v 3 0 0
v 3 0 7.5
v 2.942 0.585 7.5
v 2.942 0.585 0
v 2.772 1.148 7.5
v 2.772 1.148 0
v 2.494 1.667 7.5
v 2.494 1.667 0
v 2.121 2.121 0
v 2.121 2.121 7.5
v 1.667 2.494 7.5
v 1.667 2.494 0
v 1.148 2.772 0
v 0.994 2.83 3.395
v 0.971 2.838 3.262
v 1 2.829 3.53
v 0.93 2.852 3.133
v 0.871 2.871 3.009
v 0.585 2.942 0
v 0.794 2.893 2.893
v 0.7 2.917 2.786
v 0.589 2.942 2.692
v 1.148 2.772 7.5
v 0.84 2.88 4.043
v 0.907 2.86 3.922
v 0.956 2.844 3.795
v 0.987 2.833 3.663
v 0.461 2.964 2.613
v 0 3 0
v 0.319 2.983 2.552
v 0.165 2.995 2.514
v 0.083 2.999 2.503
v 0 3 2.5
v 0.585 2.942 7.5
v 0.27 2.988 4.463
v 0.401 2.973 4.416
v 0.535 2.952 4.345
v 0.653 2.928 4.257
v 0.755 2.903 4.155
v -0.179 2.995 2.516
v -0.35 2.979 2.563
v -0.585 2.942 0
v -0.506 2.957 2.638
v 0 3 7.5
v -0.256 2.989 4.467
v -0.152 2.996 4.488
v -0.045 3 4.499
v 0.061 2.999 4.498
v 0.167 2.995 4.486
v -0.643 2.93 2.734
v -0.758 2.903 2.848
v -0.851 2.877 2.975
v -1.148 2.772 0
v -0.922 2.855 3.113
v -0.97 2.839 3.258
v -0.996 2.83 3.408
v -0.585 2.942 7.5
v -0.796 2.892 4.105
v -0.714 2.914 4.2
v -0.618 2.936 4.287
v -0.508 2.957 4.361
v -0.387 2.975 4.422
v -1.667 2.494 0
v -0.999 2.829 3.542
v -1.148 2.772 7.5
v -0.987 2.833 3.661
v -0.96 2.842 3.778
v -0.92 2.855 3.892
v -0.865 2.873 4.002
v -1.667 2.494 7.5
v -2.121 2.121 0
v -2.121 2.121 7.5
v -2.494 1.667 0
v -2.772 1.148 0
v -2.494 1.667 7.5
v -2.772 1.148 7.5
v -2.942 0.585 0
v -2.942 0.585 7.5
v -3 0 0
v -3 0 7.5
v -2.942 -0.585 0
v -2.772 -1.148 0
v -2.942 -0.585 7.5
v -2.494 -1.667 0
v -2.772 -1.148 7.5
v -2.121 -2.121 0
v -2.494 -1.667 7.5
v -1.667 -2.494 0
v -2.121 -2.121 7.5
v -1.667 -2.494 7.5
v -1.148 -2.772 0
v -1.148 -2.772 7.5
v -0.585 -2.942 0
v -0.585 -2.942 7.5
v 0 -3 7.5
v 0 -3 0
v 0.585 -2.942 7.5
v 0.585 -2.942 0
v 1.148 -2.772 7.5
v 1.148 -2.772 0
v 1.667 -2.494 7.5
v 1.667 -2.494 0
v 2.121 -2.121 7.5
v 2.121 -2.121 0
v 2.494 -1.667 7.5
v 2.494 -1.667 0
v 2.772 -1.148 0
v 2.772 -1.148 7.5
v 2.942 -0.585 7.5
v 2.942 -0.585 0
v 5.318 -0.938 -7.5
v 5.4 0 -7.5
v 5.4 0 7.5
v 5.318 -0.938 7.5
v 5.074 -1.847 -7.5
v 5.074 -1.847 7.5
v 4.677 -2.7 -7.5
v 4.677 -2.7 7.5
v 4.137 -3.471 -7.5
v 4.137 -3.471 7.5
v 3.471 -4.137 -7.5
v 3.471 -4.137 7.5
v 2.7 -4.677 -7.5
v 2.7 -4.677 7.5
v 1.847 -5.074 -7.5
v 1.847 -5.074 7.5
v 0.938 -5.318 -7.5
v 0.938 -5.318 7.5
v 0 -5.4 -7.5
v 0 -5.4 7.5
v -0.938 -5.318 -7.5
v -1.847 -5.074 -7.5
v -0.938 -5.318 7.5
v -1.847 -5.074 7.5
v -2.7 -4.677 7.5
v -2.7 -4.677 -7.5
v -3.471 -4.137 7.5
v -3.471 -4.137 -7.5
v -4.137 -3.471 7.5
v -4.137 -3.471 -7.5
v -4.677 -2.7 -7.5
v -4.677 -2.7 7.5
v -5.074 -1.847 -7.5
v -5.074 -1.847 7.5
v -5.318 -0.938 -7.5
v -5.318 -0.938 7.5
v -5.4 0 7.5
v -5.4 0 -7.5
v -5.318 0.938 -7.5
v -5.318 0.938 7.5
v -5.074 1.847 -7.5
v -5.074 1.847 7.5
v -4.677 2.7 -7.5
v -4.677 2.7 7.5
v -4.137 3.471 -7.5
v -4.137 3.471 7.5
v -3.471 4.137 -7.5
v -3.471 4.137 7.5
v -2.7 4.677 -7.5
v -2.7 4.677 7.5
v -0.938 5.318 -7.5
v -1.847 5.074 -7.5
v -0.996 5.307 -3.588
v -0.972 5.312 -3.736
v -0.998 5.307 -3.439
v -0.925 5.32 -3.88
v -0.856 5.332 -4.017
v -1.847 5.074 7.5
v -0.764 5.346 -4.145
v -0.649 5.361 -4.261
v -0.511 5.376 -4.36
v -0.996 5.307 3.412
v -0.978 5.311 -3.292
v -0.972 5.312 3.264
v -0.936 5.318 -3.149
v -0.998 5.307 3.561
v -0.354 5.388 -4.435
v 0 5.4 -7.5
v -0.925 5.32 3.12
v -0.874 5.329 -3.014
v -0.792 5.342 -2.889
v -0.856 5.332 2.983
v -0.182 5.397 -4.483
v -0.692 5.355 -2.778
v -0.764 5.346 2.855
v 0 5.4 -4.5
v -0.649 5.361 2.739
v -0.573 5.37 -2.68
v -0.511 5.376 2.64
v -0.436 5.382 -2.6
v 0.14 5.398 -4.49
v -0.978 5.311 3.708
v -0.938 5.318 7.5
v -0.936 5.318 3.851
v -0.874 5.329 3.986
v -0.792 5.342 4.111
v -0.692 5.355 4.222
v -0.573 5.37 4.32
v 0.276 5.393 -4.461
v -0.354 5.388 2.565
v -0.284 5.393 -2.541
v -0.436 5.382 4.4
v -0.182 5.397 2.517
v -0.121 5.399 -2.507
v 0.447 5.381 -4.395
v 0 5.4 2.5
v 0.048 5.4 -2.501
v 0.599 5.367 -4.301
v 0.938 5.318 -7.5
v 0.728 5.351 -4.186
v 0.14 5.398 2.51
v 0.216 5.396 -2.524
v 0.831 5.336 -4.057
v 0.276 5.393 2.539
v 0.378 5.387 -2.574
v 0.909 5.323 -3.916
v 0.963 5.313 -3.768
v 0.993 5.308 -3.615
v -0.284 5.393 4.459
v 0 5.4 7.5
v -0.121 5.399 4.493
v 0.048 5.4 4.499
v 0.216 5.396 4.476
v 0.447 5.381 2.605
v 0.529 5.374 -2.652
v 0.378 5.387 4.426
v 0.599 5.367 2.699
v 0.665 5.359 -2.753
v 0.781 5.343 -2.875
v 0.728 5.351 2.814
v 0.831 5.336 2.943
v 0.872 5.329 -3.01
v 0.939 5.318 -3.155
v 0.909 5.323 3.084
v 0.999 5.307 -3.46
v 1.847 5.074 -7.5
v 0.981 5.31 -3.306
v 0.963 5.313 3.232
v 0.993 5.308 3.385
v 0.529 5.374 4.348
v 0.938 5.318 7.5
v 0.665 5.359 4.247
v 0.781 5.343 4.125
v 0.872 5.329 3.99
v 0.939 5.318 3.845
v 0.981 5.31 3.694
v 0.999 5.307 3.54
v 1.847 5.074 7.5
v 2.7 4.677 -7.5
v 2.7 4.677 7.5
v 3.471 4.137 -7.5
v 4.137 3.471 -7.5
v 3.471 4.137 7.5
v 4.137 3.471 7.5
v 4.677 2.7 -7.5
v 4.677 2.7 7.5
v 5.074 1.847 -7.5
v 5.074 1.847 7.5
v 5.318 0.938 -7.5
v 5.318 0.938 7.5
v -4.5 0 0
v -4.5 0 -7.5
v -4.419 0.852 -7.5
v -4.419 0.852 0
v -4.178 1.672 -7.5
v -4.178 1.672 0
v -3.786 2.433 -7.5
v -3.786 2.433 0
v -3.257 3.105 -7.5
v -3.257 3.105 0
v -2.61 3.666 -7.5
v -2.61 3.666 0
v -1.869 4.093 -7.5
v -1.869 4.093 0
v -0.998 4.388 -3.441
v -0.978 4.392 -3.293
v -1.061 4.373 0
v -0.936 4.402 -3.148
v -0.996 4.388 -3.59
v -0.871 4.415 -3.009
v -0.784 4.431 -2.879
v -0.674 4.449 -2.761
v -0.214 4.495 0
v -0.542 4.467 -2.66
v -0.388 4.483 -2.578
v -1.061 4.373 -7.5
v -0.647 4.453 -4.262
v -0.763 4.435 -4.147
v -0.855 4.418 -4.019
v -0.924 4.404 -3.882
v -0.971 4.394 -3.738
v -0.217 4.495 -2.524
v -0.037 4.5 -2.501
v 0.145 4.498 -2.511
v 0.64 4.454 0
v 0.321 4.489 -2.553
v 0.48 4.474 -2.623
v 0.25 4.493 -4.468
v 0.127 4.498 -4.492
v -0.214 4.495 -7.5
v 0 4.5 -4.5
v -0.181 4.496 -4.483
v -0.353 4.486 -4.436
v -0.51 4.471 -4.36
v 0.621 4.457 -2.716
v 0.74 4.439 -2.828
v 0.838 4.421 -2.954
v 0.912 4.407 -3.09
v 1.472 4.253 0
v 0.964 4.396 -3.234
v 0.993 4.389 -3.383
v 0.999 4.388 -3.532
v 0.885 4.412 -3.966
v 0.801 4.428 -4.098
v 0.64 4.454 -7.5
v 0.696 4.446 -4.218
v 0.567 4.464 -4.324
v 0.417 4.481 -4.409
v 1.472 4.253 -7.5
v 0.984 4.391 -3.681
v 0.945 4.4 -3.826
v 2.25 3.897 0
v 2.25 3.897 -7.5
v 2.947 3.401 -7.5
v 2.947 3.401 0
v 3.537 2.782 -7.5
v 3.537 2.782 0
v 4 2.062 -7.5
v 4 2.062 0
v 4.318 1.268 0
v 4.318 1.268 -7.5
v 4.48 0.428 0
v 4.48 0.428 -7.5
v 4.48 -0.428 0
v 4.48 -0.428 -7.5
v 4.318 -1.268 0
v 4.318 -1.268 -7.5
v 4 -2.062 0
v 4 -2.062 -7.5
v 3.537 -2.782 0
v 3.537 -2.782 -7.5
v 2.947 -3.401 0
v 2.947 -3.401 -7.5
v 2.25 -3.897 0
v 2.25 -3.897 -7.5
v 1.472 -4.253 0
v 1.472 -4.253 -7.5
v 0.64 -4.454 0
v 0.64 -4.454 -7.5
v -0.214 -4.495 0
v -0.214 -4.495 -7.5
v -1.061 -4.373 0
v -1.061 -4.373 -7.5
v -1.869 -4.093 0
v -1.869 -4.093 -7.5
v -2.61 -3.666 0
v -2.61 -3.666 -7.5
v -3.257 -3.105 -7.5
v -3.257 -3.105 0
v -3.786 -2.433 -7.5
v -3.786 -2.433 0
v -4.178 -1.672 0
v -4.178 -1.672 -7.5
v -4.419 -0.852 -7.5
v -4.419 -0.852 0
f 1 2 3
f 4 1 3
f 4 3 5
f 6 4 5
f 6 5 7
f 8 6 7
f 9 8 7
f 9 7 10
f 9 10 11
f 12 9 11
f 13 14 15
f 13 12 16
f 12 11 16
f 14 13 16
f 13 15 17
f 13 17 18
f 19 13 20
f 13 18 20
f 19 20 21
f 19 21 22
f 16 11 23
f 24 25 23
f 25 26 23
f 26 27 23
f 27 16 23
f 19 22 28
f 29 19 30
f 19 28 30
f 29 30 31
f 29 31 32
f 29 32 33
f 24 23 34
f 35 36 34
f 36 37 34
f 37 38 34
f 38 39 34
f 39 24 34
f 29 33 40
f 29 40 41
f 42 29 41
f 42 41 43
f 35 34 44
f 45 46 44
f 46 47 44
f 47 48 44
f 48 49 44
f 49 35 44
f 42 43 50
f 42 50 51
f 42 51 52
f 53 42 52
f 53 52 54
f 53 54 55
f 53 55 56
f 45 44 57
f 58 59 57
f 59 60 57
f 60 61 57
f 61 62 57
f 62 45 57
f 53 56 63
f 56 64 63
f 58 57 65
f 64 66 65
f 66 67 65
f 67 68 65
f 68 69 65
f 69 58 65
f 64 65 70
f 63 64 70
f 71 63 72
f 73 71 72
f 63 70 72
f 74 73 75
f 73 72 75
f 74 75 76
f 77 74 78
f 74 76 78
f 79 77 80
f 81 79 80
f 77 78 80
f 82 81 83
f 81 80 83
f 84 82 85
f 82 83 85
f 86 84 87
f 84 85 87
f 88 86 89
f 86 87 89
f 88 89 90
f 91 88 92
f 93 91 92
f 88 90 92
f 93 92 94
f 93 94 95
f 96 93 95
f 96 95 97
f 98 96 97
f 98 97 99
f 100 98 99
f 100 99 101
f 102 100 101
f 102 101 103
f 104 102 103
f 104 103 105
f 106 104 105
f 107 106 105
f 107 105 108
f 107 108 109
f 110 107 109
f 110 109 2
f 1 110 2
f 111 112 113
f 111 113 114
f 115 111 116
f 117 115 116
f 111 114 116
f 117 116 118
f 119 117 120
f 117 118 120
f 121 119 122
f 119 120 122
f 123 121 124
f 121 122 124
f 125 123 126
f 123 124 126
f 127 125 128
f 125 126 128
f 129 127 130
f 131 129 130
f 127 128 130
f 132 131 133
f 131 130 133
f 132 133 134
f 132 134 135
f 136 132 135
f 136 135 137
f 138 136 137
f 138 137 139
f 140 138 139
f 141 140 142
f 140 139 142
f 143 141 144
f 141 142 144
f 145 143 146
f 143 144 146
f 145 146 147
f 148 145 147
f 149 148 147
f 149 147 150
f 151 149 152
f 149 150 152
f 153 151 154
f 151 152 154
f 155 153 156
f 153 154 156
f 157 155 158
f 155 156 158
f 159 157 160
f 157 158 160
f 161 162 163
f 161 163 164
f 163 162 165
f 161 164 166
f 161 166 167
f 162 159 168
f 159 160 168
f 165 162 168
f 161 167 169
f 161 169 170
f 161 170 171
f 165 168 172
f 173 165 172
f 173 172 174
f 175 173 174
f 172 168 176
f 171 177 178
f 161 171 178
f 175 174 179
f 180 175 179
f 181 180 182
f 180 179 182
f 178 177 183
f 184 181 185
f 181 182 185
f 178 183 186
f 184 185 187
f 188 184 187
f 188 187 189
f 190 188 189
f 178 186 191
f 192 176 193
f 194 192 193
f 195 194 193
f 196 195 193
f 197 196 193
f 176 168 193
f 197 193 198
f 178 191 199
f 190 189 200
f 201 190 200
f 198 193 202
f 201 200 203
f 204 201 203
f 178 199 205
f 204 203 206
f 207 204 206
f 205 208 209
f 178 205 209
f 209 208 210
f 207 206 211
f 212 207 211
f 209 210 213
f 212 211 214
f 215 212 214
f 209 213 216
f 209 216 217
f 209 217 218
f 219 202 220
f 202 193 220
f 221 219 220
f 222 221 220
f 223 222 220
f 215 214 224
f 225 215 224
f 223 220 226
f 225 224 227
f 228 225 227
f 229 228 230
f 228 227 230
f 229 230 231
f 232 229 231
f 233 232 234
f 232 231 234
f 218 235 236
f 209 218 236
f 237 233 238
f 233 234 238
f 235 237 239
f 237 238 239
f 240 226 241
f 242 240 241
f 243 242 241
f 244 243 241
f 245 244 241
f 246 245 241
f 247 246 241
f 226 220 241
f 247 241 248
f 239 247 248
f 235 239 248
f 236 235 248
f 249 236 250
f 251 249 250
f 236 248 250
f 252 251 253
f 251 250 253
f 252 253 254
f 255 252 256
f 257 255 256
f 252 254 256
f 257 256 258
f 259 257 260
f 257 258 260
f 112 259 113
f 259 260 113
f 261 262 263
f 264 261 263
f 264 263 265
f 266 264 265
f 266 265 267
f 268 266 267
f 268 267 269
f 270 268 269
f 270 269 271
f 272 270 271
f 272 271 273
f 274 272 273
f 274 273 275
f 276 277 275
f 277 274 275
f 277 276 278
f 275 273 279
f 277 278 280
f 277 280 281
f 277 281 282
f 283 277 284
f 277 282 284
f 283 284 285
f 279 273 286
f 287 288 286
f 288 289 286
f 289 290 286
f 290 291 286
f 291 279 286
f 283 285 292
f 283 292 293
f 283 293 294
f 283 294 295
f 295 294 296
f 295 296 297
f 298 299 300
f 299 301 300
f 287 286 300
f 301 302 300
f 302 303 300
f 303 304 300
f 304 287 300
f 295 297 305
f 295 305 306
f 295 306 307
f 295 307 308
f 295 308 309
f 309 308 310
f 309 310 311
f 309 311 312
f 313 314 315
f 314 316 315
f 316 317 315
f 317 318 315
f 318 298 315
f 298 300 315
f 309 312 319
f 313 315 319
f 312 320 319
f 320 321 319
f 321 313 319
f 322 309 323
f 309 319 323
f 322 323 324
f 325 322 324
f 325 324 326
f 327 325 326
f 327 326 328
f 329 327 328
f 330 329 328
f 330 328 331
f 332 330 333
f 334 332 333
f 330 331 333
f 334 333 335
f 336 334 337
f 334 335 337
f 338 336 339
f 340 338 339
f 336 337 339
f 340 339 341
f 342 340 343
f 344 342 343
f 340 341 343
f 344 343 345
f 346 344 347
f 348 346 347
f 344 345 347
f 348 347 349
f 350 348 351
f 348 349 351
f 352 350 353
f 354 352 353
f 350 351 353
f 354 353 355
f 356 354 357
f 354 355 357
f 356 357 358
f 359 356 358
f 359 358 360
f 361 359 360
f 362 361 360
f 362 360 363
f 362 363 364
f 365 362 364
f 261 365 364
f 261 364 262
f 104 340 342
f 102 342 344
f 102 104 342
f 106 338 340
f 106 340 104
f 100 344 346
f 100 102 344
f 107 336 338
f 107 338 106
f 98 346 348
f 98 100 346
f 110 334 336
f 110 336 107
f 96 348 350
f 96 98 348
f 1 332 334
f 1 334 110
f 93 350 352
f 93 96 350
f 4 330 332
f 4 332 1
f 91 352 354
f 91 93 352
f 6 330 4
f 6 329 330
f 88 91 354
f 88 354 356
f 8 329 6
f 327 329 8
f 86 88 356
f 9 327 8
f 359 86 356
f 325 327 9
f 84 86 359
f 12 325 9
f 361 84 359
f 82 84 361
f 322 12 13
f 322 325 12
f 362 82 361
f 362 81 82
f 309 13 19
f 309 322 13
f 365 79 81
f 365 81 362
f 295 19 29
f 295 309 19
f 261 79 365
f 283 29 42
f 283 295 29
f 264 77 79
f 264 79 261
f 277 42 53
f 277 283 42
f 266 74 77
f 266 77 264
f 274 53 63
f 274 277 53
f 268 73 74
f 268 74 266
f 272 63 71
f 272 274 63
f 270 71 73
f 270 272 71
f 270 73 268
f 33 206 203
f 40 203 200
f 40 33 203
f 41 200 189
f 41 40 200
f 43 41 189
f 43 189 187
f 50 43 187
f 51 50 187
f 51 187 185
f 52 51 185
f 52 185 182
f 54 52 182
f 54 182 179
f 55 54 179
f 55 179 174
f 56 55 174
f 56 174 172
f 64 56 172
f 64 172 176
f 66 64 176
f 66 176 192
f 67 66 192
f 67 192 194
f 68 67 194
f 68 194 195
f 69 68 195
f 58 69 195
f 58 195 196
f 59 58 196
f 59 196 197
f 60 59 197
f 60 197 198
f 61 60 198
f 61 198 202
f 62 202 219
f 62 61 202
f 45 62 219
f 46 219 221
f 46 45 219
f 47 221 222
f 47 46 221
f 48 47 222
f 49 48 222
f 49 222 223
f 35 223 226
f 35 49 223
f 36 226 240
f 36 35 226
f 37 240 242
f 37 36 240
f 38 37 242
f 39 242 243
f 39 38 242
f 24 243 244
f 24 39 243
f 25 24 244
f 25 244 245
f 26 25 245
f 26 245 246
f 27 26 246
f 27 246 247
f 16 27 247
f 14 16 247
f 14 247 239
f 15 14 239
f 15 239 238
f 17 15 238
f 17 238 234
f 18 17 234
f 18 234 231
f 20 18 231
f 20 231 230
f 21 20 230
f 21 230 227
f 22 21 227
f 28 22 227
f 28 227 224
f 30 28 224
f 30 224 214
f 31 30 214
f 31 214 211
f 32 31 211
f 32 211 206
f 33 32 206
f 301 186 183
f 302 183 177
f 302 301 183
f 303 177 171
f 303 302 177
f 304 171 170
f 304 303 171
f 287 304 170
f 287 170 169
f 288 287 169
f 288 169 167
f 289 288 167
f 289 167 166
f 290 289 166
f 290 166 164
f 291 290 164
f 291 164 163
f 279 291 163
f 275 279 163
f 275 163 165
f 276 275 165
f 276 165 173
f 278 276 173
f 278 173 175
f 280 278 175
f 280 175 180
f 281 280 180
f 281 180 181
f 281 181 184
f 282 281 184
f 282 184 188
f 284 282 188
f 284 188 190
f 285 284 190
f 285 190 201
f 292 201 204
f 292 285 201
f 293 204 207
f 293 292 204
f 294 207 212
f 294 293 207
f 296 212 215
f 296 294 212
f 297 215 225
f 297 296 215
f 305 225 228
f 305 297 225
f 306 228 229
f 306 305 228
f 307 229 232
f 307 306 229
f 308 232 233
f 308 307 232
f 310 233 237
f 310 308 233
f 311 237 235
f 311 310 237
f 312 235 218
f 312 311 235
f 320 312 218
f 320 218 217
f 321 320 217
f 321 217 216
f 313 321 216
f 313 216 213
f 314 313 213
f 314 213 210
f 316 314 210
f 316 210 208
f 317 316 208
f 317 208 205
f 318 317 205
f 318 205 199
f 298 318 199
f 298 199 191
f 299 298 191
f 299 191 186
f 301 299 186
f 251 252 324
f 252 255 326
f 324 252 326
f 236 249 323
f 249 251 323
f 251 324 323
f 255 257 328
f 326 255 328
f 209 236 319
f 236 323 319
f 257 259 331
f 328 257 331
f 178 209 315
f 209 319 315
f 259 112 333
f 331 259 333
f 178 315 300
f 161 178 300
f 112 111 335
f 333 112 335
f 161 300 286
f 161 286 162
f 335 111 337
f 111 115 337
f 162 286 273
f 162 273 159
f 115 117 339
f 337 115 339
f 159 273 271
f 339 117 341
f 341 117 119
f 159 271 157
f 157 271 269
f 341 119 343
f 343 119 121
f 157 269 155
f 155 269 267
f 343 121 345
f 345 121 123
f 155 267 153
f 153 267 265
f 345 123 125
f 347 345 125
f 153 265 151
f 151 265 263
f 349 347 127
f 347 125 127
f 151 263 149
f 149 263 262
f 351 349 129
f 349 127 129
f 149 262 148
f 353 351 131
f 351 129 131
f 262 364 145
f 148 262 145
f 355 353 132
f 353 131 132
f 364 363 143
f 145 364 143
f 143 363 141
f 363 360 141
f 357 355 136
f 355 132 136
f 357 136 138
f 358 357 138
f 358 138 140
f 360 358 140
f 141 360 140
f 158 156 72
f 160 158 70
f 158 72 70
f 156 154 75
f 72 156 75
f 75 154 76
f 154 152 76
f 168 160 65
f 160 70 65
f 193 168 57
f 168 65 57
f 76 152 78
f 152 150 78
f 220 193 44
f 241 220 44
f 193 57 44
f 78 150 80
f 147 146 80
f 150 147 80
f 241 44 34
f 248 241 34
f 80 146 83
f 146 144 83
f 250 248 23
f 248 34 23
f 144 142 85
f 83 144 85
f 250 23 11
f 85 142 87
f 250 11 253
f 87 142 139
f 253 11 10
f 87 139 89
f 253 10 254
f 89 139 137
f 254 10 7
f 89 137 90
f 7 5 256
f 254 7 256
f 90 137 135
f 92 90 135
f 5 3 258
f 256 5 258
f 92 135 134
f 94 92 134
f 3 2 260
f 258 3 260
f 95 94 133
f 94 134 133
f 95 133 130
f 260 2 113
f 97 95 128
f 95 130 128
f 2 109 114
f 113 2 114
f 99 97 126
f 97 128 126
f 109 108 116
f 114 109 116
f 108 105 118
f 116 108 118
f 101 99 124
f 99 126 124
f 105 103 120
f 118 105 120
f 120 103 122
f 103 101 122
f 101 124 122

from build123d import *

# Parameters (mm, degrees)
CROQUIS2_R            = 1
CORTAR_EXTRUIR1_DEPTH = 10
CROQUIS3_R            = 3
CORTAR_EXTRUIR2_DEPTH = 7.5
CROQUIS4_R            = 4.5
CORTAR_EXTRUIR3_DEPTH = 7.5


with BuildPart() as part:
    # Croquis1 → Revolución1 (revolve)
    with BuildSketch(Plane(origin=(0, 0, 0), x_dir=(1, 0, 0), z_dir=(0, 1, 0))):
        Polygon((0, -7.5), (0, 0), (0, 7.5), (5.4, 7.5), (5.4, -7.5), align=None)
    revolve(axis=Axis((0, 0, 0), (0, 0, -1)))

    # Croquis2 → Cortar-Extruir1 (cut)
    with BuildSketch(Plane(origin=(0, 0, 0), x_dir=(1, 0, 0), z_dir=(0, 1, 0))):
        with Locations(Location((0, -3.5, 0), (0, 0, 90))):
            Circle(CROQUIS2_R)
        with Locations(Location((0, 3.5, 0), (0, 0, 90))):
            Circle(CROQUIS2_R)
    extrude(amount=CORTAR_EXTRUIR1_DEPTH, mode=Mode.SUBTRACT)

    # Croquis3 → Cortar-Extruir2 (cut)
    with BuildSketch(Plane.XY.offset(7.5)):
        Circle(CROQUIS3_R)
    extrude(amount=-CORTAR_EXTRUIR2_DEPTH, mode=Mode.SUBTRACT)

    # Croquis4 → Cortar-Extruir3 (cut)
    with BuildSketch(Plane(origin=(0, 0, -7.5), x_dir=(-1, 0, 0), z_dir=(0, 0, -1))):
        Circle(CROQUIS4_R)
    extrude(amount=-CORTAR_EXTRUIR3_DEPTH, mode=Mode.SUBTRACT)


solid = part.part
